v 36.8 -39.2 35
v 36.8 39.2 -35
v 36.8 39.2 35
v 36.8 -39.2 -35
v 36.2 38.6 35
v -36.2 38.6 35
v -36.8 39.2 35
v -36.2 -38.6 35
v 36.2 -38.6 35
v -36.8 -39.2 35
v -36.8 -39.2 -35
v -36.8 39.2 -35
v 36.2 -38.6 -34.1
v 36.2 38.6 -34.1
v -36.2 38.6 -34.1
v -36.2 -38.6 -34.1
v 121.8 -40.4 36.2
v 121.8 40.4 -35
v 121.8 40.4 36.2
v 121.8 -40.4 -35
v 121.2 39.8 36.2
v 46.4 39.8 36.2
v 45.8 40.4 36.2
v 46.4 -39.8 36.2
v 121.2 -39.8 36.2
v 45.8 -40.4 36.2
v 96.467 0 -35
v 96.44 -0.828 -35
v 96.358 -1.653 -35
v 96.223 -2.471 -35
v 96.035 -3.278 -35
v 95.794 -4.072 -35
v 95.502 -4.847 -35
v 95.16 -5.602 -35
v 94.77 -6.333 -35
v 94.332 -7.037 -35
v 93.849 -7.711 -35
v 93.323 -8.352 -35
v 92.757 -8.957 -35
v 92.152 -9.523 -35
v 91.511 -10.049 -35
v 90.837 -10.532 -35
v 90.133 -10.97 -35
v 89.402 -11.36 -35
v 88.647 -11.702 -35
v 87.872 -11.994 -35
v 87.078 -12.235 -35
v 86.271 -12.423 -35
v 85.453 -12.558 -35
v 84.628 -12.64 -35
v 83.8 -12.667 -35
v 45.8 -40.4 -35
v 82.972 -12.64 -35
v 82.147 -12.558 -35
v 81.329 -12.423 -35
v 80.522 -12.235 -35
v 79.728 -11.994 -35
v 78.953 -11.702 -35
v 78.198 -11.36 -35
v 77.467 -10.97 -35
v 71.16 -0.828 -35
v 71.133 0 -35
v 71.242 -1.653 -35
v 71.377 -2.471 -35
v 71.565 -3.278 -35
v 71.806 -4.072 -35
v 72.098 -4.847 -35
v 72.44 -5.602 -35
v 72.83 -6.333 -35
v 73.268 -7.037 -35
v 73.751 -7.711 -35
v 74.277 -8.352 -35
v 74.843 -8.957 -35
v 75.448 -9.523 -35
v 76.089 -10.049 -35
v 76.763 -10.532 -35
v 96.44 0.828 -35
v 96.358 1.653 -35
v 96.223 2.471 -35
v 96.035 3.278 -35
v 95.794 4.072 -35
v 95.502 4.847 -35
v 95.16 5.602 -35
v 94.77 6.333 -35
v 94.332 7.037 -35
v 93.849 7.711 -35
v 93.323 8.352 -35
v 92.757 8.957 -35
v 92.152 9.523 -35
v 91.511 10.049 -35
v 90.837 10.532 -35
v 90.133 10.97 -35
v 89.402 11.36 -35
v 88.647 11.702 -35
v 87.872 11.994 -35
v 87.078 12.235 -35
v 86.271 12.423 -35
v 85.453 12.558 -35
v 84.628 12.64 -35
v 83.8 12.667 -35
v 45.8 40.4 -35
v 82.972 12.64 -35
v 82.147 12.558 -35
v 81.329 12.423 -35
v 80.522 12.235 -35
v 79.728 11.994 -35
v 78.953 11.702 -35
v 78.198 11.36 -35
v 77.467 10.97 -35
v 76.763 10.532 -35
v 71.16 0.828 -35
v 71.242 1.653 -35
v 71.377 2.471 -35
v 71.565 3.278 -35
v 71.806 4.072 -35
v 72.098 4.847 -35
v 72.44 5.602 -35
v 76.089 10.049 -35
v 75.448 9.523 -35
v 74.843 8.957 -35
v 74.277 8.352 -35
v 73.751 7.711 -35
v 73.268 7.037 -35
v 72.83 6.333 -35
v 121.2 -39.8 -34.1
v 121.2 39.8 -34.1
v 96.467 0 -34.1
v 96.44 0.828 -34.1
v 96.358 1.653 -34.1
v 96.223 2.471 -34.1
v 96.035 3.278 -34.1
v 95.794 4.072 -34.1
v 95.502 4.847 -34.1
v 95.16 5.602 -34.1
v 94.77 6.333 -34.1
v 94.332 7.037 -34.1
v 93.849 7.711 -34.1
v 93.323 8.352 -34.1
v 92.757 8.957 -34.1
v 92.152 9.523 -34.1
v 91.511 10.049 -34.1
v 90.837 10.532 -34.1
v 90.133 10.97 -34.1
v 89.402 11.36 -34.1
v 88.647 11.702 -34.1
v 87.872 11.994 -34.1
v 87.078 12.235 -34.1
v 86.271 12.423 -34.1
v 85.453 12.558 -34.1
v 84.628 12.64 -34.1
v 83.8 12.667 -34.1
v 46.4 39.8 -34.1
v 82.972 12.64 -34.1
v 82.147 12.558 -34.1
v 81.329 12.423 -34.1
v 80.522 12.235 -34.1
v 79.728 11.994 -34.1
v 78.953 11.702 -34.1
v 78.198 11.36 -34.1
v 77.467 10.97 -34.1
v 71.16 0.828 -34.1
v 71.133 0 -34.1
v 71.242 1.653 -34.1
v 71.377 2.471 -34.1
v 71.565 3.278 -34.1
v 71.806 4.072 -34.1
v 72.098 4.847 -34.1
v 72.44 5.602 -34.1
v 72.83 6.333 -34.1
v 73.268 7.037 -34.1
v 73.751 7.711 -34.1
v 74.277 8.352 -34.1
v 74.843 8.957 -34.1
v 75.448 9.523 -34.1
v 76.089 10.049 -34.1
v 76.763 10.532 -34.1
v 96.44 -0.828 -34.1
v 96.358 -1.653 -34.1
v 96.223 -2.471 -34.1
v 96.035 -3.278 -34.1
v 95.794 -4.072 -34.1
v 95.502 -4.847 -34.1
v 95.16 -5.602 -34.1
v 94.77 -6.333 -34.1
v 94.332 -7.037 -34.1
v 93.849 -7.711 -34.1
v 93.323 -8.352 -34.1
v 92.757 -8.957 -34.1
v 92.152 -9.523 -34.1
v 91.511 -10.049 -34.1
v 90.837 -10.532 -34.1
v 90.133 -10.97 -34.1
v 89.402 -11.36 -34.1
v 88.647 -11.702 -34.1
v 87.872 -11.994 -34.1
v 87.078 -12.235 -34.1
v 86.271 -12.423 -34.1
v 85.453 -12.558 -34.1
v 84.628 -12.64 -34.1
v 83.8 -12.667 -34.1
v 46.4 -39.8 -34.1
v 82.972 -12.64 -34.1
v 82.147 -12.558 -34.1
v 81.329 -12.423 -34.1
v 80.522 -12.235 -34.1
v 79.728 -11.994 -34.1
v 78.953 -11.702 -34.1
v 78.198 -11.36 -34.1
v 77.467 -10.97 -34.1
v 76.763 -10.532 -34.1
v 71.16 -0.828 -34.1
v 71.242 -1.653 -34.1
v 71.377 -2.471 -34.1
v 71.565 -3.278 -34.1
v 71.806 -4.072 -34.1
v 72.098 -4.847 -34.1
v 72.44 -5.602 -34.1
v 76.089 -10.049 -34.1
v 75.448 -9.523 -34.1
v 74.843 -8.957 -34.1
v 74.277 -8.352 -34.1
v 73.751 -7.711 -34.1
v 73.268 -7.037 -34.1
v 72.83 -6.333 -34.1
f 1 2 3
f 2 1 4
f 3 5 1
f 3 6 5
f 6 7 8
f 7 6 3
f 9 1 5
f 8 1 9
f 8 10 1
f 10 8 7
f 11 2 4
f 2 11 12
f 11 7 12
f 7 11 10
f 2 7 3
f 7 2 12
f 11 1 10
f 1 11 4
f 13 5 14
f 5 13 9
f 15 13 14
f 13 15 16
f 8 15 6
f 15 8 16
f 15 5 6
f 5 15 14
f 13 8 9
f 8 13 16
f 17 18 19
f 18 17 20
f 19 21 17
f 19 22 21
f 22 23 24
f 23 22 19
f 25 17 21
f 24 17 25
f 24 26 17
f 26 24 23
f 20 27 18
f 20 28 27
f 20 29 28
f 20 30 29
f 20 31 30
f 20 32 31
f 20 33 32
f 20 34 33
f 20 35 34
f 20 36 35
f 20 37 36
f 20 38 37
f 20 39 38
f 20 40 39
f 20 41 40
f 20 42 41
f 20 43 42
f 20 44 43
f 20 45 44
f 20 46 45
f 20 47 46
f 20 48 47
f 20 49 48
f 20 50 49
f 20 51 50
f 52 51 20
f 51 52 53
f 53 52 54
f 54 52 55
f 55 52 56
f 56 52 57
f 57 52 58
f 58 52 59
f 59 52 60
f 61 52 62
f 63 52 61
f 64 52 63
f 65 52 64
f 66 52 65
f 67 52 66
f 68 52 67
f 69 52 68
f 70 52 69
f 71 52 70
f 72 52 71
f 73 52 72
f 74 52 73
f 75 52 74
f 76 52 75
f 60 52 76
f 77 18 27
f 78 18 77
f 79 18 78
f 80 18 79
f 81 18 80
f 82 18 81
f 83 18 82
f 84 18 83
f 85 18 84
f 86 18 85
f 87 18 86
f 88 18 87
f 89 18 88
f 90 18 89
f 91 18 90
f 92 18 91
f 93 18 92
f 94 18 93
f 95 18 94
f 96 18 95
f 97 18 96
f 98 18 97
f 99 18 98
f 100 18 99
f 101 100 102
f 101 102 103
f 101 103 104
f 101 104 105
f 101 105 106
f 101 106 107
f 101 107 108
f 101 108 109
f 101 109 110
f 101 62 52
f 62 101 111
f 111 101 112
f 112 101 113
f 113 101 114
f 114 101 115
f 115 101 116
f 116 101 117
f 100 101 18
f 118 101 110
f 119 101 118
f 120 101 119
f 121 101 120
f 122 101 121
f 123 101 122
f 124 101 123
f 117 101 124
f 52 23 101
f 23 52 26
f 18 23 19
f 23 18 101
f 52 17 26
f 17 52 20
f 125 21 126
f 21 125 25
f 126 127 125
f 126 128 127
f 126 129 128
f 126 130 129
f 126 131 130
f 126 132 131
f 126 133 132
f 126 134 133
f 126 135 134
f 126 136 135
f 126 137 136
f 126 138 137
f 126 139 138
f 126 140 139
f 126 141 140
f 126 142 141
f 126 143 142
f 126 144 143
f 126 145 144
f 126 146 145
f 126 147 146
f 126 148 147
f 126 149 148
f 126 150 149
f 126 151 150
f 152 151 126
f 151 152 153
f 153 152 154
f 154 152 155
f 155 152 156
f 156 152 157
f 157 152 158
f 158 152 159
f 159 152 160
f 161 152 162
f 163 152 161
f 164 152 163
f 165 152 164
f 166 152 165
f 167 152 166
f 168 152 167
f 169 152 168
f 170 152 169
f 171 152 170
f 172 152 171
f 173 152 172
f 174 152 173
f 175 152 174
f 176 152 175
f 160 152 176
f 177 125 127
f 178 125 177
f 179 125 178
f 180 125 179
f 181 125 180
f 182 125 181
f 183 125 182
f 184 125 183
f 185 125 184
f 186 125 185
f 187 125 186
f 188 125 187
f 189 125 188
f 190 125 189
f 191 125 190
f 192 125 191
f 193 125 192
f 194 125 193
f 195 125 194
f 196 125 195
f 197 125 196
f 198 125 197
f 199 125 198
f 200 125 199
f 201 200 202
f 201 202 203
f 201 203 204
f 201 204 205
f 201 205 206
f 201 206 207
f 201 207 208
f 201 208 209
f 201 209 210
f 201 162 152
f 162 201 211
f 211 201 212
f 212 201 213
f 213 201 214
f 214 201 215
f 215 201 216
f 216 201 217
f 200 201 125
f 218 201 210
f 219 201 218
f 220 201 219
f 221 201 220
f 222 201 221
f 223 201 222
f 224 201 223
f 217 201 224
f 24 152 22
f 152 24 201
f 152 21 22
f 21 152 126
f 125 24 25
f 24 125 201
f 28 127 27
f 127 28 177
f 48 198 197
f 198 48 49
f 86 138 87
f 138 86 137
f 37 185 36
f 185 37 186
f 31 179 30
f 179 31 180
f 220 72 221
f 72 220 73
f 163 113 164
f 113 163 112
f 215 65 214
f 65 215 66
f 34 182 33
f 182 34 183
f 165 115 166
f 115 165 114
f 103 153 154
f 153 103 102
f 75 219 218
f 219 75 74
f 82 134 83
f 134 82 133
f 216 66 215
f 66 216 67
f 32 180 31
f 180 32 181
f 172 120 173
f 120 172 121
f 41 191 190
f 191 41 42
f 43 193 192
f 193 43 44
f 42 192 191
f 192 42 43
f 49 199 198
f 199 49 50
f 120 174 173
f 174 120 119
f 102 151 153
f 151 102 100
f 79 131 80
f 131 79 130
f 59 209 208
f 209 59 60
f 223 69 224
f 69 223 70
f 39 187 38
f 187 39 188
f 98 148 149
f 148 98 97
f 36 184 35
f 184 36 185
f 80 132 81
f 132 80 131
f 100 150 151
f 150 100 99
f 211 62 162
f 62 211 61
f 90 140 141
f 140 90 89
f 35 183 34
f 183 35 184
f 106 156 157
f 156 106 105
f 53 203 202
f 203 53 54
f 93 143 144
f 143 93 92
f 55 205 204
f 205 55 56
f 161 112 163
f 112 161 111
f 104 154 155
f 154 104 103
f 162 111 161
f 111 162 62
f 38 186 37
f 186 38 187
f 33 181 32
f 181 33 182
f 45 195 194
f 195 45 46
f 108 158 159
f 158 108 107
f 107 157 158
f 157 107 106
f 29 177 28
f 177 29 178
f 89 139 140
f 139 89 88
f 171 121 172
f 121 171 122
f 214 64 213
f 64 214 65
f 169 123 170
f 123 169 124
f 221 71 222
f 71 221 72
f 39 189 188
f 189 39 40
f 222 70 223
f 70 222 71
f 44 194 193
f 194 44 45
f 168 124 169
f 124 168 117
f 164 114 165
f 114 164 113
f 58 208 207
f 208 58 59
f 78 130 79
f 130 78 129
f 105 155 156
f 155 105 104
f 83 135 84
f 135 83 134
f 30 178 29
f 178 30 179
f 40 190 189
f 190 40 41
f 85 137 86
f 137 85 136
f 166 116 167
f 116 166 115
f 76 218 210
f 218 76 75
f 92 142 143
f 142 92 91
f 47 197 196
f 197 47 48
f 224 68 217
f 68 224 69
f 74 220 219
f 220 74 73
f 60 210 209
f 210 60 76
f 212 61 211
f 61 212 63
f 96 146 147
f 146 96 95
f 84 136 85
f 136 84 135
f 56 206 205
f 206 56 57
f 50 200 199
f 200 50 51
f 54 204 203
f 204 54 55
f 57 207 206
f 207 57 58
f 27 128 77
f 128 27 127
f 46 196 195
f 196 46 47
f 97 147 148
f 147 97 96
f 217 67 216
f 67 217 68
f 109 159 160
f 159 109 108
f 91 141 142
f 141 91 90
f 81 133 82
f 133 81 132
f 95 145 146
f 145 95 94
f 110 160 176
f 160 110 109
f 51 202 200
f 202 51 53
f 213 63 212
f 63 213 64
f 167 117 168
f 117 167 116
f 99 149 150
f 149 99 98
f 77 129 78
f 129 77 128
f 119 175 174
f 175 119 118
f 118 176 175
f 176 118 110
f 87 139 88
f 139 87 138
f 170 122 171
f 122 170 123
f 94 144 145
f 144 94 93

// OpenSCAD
inner_h = 70;
thickness = 0.6;
spacing = 0.6;

function outer_h(inner_h, thickness) = inner_h + thickness;

function inner_w(inner_h, thickness) = outer_h(inner_h, thickness) + 2 * thickness;

function outer_w(inner_h, thickness) = inner_w(inner_h, thickness) + 2 * thickness;

function inner_l(inner_h, thickness) = outer_w(inner_h, thickness) + 2 * thickness;

function outer_l(inner_h, thickness) = inner_l(inner_h, thickness) + 2 * thickness;

module box_without_upper(w, h, l, thickness) {
	difference() {
	    cube([w, l, h], center = true);
	    translate([0, 0, thickness]) 
		    cube([w - 2 * thickness, l - 2 * thickness, h - thickness], center = true);
    }    
}

module inner_box(inner_h, thickness, spacing) {
    w = inner_w(inner_h, thickness + spacing);
	h = inner_h;
	l = inner_l(inner_h, thickness + spacing);
	
	box_without_upper(w, h, l, thickness);
}

module outer_box(inner_h, thickness, spacing) {
    w = outer_w(inner_h, thickness + spacing);
    h = outer_h(inner_h, thickness + spacing);
    l = outer_l(inner_h, thickness + spacing);

    difference() {	
        box_without_upper(w, h, l, thickness);
	    translate([0, 0, -h / 2]) linear_extrude(thickness * 2) circle(w / 6, $fn=96);
	}
}

inner_box(inner_h, thickness, spacing);
translate([inner_w(inner_h, thickness) + 20 * thickness, 0, thickness / 2 + spacing / 2]) 
    outer_box(inner_h, thickness, spacing);





